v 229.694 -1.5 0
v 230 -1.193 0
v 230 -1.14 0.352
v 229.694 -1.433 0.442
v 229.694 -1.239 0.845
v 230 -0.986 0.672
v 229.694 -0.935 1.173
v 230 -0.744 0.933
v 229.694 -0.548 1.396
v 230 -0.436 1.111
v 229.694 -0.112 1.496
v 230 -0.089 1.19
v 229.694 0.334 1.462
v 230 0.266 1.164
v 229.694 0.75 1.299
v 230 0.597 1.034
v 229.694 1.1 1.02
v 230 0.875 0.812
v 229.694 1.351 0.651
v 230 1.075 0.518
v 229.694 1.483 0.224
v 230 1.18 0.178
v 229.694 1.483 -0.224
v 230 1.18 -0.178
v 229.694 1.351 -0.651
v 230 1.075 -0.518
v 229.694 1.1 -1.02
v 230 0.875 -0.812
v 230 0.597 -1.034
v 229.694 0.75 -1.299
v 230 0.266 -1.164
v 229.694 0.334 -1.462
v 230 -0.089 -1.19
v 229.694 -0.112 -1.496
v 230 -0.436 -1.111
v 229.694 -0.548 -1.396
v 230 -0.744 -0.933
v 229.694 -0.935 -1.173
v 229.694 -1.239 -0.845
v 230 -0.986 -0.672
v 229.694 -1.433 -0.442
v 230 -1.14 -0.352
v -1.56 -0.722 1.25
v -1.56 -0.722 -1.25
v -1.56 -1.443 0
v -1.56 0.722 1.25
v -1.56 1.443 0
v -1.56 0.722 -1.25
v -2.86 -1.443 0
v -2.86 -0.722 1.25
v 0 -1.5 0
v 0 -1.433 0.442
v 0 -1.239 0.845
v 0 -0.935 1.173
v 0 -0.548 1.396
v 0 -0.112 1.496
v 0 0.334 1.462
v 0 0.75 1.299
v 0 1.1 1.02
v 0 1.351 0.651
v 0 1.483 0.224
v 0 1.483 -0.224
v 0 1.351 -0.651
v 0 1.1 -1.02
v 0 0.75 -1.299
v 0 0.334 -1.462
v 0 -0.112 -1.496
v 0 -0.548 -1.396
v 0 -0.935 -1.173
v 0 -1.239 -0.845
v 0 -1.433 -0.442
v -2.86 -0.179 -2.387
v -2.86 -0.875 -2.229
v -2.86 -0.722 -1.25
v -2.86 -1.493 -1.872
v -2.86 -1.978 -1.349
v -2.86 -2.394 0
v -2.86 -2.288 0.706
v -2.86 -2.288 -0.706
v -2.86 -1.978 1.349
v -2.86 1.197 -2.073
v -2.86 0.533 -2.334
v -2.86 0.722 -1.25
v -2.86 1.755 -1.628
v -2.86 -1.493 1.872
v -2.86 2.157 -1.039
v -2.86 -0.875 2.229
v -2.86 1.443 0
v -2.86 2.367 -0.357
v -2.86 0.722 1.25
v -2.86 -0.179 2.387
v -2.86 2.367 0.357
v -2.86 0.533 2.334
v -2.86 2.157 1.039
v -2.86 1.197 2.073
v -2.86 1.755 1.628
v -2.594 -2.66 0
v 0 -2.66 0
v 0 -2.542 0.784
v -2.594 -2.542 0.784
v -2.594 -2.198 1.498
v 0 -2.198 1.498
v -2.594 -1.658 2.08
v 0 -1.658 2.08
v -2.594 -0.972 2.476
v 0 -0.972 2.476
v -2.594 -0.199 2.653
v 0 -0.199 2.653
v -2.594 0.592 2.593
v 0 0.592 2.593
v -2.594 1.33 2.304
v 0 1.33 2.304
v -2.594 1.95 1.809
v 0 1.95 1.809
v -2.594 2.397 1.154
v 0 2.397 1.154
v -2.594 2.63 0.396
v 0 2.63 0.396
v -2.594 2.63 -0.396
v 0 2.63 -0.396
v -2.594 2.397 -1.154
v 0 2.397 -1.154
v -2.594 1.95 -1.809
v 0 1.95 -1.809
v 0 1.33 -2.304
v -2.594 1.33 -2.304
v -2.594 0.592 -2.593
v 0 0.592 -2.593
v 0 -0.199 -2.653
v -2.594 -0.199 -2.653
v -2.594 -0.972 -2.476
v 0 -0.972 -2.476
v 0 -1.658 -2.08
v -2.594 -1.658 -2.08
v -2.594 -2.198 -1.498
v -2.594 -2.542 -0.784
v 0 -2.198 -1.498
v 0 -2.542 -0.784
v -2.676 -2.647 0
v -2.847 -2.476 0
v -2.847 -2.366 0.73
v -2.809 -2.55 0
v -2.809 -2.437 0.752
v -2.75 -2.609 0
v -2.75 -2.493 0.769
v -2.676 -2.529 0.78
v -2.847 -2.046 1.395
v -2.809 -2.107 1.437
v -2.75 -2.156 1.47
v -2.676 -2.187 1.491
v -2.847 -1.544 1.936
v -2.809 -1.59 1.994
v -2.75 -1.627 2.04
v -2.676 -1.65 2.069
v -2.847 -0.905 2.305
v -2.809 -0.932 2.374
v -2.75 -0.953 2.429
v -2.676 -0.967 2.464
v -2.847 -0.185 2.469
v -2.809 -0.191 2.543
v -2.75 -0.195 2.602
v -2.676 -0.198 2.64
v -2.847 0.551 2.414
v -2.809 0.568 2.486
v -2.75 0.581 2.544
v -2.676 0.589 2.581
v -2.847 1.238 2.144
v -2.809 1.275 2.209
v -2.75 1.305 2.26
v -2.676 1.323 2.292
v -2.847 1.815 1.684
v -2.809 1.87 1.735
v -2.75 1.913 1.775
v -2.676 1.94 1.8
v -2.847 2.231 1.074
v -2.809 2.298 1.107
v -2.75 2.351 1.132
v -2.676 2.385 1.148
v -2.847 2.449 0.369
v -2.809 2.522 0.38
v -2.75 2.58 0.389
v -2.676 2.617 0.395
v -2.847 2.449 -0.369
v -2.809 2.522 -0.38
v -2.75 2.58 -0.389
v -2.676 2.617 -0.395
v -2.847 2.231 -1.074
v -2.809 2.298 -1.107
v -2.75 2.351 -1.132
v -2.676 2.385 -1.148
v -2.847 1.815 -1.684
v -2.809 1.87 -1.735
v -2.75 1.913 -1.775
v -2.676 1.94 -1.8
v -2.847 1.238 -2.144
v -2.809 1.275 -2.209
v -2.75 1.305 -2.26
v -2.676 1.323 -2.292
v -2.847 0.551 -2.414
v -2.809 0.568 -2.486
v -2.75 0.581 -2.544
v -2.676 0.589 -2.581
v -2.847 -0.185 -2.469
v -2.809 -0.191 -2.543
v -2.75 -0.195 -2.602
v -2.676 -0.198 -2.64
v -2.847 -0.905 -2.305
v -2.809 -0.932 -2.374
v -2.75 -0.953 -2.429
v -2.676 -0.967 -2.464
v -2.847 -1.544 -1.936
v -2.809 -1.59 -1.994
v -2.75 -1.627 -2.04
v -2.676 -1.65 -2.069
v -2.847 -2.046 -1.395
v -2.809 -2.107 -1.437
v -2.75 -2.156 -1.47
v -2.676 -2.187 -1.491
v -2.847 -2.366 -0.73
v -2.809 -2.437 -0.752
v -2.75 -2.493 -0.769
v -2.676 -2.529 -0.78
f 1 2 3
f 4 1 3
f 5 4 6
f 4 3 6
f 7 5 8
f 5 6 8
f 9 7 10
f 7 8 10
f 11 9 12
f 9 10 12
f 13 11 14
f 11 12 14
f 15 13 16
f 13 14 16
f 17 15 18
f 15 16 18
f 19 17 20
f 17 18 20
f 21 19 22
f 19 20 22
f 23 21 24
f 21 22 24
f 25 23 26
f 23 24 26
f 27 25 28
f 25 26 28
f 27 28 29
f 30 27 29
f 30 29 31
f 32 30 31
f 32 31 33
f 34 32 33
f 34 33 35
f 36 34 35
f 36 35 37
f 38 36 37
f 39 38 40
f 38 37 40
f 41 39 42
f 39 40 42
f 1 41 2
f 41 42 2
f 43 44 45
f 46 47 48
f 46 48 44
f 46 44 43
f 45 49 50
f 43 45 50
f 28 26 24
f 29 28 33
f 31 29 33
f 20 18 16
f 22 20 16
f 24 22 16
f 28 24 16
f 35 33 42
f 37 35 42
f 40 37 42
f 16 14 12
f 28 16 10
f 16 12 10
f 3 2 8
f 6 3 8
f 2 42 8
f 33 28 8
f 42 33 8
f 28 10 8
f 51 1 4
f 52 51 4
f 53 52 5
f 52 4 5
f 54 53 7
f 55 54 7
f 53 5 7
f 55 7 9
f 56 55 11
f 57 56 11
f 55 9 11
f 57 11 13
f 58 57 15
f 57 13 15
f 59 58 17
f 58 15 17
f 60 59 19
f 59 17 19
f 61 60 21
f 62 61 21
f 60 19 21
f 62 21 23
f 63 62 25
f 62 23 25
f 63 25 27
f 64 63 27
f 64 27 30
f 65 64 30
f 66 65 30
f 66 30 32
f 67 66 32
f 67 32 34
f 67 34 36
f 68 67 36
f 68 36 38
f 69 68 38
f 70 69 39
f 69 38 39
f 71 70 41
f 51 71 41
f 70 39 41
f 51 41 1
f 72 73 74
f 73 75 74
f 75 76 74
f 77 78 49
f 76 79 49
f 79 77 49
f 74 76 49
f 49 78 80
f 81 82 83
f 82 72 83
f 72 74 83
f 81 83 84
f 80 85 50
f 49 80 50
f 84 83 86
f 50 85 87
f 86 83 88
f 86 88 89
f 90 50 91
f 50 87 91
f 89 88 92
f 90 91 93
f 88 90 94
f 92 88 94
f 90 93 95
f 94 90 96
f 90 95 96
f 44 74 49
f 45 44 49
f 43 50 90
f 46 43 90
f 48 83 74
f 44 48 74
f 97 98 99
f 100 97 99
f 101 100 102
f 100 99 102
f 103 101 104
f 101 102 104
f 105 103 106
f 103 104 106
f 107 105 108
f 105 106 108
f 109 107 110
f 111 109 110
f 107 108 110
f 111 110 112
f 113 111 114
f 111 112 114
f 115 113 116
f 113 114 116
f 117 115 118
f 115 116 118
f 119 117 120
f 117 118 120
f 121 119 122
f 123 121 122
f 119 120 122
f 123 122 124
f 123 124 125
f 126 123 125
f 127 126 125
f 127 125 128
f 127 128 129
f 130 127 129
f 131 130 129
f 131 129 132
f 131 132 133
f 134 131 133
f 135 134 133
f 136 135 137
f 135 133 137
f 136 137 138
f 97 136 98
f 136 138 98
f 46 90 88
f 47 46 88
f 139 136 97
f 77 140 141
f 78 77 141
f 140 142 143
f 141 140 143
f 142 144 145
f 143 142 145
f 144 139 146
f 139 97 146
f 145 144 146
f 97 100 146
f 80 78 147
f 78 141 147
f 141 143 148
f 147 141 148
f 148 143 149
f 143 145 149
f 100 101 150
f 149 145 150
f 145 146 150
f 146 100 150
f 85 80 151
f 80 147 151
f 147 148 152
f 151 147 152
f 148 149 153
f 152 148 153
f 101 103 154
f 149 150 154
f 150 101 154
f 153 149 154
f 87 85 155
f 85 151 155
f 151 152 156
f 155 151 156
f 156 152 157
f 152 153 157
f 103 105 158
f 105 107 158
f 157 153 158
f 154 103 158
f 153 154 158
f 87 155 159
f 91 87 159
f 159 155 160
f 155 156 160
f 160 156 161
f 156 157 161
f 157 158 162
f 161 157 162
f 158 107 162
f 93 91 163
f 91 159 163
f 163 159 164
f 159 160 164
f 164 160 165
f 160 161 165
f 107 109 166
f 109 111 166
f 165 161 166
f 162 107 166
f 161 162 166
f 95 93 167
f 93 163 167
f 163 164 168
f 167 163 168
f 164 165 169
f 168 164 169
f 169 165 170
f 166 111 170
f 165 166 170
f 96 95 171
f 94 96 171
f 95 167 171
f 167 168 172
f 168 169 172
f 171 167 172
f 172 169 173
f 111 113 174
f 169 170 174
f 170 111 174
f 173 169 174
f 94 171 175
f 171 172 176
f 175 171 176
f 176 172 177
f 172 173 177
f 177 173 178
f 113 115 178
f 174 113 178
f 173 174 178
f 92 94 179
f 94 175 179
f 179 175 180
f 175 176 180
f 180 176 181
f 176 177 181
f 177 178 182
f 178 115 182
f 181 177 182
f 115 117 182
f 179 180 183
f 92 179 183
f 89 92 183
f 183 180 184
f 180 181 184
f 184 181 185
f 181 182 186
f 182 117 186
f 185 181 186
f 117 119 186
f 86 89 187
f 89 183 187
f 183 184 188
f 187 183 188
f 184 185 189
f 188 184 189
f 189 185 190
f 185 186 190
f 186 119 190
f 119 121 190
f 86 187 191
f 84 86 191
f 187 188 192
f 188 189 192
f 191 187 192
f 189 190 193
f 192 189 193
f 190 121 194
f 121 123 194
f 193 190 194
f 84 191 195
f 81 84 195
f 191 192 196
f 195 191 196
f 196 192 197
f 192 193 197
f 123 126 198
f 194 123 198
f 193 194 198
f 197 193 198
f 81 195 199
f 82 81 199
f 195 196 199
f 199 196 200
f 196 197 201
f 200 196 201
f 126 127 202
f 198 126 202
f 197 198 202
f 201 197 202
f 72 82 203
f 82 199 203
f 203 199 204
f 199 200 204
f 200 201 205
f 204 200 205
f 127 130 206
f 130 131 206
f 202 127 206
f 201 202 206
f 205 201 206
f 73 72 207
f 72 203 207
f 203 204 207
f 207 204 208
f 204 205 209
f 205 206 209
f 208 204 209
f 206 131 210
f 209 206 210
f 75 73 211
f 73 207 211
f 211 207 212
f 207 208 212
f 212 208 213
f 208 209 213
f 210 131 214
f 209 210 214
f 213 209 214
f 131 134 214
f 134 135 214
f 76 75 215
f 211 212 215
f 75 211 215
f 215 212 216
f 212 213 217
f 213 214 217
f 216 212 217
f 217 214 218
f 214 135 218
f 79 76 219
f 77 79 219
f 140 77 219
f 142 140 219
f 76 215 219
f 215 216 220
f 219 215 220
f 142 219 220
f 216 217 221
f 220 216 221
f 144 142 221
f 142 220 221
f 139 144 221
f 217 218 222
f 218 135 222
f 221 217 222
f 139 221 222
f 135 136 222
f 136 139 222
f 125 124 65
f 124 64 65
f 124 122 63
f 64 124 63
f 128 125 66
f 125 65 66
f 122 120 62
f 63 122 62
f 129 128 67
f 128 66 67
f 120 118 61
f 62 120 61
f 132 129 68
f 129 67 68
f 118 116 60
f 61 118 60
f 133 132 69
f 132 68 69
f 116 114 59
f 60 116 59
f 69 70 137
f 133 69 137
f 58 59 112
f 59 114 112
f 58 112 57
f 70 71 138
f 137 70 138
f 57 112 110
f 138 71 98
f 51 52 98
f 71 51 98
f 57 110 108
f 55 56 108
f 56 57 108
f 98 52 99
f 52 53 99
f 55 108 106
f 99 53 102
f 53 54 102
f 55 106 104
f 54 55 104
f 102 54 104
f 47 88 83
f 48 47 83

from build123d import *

# Parameters (mm, degrees)
CUT_EXTRUDE1_DEPTH = 1.3
FILLET1_R          = 0.266
CHAMFER2_SIZE      = 0.3065


with BuildPart() as part:
    # Sketch1 → Revolve1 (revolve)
    with BuildSketch(Plane(origin=(0, 0, 0), x_dir=(-1, 0, 0), z_dir=(0, 0, -1)), mode=Mode.PRIVATE) as revolve1_sk:
        Polygon((0, 0), (2.86, 0), (2.86, 2.66), (0, 2.66), (0, 1.5), (-230, 1.5), (-230, 0), align=None)
    revolve(revolve1_sk.sketch.rotate(Axis((0, 0, 0), (-1, 0, 0)), 180), axis=Axis((0, 0, 0), (-1, 0, 0)))

    # Sketch2 → Cut-Extrude1 (cut)
    with BuildSketch(Plane.ZY.offset(2.86)):
        Polygon((-1.25, -0.721687836), (0, -1.443375673), (1.25, -0.721687836), (1.25, 0.721687836), (0, 1.443375673), (-1.25, 0.721687836), align=None)
    extrude(amount=-CUT_EXTRUDE1_DEPTH, mode=Mode.SUBTRACT)

    # Fillet1
    fillet1_edges = [part.edges().sort_by_distance(p)[0] for p in [
        (-2.86, 2.66, 0),
    ]]
    fillet(fillet1_edges, radius=FILLET1_R)

    # Chamfer2
    chamfer2_edges = [part.edges().sort_by_distance(p)[0] for p in [
        (230, 1.5, 0),
    ]]
    chamfer(chamfer2_edges, length=CHAMFER2_SIZE)


solid = part.part
